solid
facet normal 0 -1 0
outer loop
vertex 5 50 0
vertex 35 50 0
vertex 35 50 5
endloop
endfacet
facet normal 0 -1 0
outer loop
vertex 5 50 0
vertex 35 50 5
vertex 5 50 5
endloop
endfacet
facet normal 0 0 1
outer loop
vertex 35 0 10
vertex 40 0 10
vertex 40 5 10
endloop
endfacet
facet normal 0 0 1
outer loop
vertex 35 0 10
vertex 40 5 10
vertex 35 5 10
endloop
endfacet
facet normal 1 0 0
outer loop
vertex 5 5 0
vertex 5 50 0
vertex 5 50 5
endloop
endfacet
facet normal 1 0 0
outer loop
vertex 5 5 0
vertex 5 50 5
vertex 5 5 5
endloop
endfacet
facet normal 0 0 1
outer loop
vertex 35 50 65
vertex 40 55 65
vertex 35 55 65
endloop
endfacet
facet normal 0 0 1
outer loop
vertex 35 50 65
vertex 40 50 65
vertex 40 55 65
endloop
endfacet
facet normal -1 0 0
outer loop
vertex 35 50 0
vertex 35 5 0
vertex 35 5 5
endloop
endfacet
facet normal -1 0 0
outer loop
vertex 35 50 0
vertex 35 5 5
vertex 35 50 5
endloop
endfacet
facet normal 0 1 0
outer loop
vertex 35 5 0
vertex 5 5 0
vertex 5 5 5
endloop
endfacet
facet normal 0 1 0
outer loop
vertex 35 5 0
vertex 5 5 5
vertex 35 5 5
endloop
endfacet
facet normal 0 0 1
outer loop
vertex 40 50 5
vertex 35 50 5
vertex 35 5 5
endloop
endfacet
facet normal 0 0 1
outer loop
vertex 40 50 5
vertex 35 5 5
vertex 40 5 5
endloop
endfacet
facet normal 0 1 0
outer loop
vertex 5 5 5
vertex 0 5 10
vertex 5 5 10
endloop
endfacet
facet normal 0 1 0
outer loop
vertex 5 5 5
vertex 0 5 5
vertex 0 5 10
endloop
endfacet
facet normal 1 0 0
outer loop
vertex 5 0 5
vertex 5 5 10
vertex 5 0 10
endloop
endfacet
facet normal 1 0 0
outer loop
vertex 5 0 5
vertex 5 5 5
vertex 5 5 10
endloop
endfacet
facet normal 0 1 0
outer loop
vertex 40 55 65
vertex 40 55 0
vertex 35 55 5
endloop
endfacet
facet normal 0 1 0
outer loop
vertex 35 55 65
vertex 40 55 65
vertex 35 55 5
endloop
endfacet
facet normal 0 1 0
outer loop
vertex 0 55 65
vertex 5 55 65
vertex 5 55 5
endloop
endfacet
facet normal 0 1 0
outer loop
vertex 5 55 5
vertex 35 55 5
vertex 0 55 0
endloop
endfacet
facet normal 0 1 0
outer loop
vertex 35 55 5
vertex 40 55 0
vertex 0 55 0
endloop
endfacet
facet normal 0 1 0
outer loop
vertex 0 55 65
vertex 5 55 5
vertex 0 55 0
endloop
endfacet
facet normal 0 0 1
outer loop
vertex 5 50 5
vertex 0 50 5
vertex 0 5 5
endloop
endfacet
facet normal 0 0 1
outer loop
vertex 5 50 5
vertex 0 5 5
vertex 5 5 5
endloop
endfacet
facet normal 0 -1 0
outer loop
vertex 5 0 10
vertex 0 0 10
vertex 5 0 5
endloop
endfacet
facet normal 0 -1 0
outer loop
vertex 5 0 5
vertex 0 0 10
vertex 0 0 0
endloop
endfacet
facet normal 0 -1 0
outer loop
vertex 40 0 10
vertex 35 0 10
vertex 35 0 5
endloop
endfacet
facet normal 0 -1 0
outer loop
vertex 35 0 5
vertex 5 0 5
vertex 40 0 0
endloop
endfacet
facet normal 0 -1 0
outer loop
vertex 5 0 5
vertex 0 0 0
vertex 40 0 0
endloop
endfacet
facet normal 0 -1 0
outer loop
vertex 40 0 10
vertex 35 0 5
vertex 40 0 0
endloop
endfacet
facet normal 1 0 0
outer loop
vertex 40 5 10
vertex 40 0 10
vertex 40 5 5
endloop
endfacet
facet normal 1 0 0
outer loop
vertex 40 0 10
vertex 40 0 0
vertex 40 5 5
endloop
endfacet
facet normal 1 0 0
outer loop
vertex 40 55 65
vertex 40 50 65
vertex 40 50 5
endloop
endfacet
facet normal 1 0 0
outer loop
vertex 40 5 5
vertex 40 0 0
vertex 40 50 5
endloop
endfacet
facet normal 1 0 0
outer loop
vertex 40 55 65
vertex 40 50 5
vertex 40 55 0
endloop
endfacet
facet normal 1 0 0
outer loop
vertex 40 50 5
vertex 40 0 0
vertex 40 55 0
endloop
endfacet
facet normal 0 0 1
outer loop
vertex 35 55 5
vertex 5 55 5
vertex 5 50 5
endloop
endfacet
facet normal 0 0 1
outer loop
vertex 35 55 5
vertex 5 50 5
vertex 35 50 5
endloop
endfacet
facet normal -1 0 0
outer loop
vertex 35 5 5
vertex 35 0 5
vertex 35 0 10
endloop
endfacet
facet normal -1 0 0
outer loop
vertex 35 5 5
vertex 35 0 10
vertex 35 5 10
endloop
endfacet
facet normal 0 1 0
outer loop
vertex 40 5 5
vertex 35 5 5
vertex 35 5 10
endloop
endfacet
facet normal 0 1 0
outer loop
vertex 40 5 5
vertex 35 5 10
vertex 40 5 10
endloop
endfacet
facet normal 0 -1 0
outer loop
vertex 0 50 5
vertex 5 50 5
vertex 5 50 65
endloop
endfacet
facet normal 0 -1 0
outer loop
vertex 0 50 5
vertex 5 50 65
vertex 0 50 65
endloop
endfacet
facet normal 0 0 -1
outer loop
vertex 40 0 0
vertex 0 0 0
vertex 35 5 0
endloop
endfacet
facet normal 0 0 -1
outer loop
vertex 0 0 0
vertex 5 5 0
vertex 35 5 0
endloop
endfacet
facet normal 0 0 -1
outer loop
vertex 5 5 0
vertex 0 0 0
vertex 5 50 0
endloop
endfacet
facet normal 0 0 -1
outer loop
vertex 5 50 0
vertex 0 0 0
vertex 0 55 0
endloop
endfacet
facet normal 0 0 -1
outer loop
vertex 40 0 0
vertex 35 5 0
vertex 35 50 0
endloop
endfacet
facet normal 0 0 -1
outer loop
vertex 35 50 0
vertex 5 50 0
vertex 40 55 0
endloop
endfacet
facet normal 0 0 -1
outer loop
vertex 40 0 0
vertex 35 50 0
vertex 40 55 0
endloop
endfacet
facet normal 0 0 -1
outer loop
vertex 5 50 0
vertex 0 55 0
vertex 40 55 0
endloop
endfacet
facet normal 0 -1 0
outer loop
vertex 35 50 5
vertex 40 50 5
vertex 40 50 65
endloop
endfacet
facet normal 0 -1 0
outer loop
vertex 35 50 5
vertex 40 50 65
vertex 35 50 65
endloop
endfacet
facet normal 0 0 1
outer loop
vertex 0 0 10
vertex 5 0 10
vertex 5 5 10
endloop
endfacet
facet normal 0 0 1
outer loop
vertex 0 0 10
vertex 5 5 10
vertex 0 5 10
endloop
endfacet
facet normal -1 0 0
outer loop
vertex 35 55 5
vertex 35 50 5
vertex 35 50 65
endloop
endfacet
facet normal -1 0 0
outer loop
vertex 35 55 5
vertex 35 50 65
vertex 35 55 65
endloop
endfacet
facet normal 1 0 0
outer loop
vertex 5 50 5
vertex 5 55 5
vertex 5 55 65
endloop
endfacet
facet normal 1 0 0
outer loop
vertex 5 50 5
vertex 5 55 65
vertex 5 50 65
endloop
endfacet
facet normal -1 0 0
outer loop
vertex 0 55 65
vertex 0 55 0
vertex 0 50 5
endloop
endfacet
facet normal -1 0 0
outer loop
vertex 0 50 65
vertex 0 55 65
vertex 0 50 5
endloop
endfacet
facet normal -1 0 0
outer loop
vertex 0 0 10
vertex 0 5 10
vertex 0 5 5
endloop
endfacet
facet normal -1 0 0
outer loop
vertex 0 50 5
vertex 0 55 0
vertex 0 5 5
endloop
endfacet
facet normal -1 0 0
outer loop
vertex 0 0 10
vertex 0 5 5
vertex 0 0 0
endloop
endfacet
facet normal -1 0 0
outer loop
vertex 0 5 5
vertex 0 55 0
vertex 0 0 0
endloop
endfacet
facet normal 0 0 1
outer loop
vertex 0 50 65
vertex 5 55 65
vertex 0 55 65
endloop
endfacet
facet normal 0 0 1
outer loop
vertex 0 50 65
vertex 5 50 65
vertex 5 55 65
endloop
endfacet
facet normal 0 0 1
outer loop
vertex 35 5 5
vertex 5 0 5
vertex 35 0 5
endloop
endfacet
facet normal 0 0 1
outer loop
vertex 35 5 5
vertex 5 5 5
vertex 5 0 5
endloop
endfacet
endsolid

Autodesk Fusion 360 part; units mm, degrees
sketch "Sketch1" plane through (0, 0, 0) normal (0, 0, 1) x (1, 0, 0)
  line L0 (0, 0) -> (40, 0)
  line L1 (40, 0) -> (40, 55)
  line L2 (40, 55) -> (0, 55)
  line L3 (0, 55) -> (0, 0)
  line L4 (5, 5) -> (35, 5)
  line L5 (35, 5) -> (35, 50)
  line L6 (35, 50) -> (5, 50)
  line L7 (5, 50) -> (5, 5)
  dimension "d1" = 40
  dimension "d2" = 55
  dimension "d3" = 30
  dimension "d4" = 45
extrude "Extrude1" add sketch "Sketch1" along normal blind 5
sketch "Sketch2" plane through (0, 0, 5) normal (0, 0, 1) x (-1, 0, 0)
  line L0 (-5, -5) -> (-5, -50)
  line L1 (-5, -50) -> (-35, -50)
  line L2 (-35, -50) -> (-35, -5)
  line L3 (-35, -5) -> (-5, -5)
  line L4 (0, -55) -> (0, 0)
  line L5 (0, 0) -> (-40, 0)
  line L6 (-40, 0) -> (-40, -55)
  line L7 (-40, -55) -> (0, -55)
  line L8 (0, -55) -> (-5, -55)
  line L9 (-5, -55) -> (-5, -50)
  line L10 (-5, -50) -> (0, -50)
  line L11 (0, -50) -> (0, -55)
  line L12 (-35, -55) -> (-40, -55)
  line L13 (-40, -55) -> (-40, -50)
  line L14 (-40, -50) -> (-35, -50)
  line L15 (-35, -50) -> (-35, -55)
  line L16 (-35, -5) -> (-40, -5)
  line L17 (-40, -5) -> (-40, 0)
  line L18 (-40, 0) -> (-35, 0)
  line L19 (-35, 0) -> (-35, -5)
  line L20 (0, -5) -> (-5, -5)
  line L21 (-5, -5) -> (-5, 0)
  line L22 (-5, 0) -> (0, 0)
  line L23 (0, 0) -> (0, -5)
extrude "Extrude2" add sketch "Sketch2" along normal blind 5 contours L4 L5 L20 L21 L22 L23 | L5 L6 L16 L17 L18 L19
extrude "Extrude3" add sketch "Sketch2" along normal blind 60 contours L4 L7 L8 L9 L10 L11 | L6 L7 L12 L13 L14 L15
